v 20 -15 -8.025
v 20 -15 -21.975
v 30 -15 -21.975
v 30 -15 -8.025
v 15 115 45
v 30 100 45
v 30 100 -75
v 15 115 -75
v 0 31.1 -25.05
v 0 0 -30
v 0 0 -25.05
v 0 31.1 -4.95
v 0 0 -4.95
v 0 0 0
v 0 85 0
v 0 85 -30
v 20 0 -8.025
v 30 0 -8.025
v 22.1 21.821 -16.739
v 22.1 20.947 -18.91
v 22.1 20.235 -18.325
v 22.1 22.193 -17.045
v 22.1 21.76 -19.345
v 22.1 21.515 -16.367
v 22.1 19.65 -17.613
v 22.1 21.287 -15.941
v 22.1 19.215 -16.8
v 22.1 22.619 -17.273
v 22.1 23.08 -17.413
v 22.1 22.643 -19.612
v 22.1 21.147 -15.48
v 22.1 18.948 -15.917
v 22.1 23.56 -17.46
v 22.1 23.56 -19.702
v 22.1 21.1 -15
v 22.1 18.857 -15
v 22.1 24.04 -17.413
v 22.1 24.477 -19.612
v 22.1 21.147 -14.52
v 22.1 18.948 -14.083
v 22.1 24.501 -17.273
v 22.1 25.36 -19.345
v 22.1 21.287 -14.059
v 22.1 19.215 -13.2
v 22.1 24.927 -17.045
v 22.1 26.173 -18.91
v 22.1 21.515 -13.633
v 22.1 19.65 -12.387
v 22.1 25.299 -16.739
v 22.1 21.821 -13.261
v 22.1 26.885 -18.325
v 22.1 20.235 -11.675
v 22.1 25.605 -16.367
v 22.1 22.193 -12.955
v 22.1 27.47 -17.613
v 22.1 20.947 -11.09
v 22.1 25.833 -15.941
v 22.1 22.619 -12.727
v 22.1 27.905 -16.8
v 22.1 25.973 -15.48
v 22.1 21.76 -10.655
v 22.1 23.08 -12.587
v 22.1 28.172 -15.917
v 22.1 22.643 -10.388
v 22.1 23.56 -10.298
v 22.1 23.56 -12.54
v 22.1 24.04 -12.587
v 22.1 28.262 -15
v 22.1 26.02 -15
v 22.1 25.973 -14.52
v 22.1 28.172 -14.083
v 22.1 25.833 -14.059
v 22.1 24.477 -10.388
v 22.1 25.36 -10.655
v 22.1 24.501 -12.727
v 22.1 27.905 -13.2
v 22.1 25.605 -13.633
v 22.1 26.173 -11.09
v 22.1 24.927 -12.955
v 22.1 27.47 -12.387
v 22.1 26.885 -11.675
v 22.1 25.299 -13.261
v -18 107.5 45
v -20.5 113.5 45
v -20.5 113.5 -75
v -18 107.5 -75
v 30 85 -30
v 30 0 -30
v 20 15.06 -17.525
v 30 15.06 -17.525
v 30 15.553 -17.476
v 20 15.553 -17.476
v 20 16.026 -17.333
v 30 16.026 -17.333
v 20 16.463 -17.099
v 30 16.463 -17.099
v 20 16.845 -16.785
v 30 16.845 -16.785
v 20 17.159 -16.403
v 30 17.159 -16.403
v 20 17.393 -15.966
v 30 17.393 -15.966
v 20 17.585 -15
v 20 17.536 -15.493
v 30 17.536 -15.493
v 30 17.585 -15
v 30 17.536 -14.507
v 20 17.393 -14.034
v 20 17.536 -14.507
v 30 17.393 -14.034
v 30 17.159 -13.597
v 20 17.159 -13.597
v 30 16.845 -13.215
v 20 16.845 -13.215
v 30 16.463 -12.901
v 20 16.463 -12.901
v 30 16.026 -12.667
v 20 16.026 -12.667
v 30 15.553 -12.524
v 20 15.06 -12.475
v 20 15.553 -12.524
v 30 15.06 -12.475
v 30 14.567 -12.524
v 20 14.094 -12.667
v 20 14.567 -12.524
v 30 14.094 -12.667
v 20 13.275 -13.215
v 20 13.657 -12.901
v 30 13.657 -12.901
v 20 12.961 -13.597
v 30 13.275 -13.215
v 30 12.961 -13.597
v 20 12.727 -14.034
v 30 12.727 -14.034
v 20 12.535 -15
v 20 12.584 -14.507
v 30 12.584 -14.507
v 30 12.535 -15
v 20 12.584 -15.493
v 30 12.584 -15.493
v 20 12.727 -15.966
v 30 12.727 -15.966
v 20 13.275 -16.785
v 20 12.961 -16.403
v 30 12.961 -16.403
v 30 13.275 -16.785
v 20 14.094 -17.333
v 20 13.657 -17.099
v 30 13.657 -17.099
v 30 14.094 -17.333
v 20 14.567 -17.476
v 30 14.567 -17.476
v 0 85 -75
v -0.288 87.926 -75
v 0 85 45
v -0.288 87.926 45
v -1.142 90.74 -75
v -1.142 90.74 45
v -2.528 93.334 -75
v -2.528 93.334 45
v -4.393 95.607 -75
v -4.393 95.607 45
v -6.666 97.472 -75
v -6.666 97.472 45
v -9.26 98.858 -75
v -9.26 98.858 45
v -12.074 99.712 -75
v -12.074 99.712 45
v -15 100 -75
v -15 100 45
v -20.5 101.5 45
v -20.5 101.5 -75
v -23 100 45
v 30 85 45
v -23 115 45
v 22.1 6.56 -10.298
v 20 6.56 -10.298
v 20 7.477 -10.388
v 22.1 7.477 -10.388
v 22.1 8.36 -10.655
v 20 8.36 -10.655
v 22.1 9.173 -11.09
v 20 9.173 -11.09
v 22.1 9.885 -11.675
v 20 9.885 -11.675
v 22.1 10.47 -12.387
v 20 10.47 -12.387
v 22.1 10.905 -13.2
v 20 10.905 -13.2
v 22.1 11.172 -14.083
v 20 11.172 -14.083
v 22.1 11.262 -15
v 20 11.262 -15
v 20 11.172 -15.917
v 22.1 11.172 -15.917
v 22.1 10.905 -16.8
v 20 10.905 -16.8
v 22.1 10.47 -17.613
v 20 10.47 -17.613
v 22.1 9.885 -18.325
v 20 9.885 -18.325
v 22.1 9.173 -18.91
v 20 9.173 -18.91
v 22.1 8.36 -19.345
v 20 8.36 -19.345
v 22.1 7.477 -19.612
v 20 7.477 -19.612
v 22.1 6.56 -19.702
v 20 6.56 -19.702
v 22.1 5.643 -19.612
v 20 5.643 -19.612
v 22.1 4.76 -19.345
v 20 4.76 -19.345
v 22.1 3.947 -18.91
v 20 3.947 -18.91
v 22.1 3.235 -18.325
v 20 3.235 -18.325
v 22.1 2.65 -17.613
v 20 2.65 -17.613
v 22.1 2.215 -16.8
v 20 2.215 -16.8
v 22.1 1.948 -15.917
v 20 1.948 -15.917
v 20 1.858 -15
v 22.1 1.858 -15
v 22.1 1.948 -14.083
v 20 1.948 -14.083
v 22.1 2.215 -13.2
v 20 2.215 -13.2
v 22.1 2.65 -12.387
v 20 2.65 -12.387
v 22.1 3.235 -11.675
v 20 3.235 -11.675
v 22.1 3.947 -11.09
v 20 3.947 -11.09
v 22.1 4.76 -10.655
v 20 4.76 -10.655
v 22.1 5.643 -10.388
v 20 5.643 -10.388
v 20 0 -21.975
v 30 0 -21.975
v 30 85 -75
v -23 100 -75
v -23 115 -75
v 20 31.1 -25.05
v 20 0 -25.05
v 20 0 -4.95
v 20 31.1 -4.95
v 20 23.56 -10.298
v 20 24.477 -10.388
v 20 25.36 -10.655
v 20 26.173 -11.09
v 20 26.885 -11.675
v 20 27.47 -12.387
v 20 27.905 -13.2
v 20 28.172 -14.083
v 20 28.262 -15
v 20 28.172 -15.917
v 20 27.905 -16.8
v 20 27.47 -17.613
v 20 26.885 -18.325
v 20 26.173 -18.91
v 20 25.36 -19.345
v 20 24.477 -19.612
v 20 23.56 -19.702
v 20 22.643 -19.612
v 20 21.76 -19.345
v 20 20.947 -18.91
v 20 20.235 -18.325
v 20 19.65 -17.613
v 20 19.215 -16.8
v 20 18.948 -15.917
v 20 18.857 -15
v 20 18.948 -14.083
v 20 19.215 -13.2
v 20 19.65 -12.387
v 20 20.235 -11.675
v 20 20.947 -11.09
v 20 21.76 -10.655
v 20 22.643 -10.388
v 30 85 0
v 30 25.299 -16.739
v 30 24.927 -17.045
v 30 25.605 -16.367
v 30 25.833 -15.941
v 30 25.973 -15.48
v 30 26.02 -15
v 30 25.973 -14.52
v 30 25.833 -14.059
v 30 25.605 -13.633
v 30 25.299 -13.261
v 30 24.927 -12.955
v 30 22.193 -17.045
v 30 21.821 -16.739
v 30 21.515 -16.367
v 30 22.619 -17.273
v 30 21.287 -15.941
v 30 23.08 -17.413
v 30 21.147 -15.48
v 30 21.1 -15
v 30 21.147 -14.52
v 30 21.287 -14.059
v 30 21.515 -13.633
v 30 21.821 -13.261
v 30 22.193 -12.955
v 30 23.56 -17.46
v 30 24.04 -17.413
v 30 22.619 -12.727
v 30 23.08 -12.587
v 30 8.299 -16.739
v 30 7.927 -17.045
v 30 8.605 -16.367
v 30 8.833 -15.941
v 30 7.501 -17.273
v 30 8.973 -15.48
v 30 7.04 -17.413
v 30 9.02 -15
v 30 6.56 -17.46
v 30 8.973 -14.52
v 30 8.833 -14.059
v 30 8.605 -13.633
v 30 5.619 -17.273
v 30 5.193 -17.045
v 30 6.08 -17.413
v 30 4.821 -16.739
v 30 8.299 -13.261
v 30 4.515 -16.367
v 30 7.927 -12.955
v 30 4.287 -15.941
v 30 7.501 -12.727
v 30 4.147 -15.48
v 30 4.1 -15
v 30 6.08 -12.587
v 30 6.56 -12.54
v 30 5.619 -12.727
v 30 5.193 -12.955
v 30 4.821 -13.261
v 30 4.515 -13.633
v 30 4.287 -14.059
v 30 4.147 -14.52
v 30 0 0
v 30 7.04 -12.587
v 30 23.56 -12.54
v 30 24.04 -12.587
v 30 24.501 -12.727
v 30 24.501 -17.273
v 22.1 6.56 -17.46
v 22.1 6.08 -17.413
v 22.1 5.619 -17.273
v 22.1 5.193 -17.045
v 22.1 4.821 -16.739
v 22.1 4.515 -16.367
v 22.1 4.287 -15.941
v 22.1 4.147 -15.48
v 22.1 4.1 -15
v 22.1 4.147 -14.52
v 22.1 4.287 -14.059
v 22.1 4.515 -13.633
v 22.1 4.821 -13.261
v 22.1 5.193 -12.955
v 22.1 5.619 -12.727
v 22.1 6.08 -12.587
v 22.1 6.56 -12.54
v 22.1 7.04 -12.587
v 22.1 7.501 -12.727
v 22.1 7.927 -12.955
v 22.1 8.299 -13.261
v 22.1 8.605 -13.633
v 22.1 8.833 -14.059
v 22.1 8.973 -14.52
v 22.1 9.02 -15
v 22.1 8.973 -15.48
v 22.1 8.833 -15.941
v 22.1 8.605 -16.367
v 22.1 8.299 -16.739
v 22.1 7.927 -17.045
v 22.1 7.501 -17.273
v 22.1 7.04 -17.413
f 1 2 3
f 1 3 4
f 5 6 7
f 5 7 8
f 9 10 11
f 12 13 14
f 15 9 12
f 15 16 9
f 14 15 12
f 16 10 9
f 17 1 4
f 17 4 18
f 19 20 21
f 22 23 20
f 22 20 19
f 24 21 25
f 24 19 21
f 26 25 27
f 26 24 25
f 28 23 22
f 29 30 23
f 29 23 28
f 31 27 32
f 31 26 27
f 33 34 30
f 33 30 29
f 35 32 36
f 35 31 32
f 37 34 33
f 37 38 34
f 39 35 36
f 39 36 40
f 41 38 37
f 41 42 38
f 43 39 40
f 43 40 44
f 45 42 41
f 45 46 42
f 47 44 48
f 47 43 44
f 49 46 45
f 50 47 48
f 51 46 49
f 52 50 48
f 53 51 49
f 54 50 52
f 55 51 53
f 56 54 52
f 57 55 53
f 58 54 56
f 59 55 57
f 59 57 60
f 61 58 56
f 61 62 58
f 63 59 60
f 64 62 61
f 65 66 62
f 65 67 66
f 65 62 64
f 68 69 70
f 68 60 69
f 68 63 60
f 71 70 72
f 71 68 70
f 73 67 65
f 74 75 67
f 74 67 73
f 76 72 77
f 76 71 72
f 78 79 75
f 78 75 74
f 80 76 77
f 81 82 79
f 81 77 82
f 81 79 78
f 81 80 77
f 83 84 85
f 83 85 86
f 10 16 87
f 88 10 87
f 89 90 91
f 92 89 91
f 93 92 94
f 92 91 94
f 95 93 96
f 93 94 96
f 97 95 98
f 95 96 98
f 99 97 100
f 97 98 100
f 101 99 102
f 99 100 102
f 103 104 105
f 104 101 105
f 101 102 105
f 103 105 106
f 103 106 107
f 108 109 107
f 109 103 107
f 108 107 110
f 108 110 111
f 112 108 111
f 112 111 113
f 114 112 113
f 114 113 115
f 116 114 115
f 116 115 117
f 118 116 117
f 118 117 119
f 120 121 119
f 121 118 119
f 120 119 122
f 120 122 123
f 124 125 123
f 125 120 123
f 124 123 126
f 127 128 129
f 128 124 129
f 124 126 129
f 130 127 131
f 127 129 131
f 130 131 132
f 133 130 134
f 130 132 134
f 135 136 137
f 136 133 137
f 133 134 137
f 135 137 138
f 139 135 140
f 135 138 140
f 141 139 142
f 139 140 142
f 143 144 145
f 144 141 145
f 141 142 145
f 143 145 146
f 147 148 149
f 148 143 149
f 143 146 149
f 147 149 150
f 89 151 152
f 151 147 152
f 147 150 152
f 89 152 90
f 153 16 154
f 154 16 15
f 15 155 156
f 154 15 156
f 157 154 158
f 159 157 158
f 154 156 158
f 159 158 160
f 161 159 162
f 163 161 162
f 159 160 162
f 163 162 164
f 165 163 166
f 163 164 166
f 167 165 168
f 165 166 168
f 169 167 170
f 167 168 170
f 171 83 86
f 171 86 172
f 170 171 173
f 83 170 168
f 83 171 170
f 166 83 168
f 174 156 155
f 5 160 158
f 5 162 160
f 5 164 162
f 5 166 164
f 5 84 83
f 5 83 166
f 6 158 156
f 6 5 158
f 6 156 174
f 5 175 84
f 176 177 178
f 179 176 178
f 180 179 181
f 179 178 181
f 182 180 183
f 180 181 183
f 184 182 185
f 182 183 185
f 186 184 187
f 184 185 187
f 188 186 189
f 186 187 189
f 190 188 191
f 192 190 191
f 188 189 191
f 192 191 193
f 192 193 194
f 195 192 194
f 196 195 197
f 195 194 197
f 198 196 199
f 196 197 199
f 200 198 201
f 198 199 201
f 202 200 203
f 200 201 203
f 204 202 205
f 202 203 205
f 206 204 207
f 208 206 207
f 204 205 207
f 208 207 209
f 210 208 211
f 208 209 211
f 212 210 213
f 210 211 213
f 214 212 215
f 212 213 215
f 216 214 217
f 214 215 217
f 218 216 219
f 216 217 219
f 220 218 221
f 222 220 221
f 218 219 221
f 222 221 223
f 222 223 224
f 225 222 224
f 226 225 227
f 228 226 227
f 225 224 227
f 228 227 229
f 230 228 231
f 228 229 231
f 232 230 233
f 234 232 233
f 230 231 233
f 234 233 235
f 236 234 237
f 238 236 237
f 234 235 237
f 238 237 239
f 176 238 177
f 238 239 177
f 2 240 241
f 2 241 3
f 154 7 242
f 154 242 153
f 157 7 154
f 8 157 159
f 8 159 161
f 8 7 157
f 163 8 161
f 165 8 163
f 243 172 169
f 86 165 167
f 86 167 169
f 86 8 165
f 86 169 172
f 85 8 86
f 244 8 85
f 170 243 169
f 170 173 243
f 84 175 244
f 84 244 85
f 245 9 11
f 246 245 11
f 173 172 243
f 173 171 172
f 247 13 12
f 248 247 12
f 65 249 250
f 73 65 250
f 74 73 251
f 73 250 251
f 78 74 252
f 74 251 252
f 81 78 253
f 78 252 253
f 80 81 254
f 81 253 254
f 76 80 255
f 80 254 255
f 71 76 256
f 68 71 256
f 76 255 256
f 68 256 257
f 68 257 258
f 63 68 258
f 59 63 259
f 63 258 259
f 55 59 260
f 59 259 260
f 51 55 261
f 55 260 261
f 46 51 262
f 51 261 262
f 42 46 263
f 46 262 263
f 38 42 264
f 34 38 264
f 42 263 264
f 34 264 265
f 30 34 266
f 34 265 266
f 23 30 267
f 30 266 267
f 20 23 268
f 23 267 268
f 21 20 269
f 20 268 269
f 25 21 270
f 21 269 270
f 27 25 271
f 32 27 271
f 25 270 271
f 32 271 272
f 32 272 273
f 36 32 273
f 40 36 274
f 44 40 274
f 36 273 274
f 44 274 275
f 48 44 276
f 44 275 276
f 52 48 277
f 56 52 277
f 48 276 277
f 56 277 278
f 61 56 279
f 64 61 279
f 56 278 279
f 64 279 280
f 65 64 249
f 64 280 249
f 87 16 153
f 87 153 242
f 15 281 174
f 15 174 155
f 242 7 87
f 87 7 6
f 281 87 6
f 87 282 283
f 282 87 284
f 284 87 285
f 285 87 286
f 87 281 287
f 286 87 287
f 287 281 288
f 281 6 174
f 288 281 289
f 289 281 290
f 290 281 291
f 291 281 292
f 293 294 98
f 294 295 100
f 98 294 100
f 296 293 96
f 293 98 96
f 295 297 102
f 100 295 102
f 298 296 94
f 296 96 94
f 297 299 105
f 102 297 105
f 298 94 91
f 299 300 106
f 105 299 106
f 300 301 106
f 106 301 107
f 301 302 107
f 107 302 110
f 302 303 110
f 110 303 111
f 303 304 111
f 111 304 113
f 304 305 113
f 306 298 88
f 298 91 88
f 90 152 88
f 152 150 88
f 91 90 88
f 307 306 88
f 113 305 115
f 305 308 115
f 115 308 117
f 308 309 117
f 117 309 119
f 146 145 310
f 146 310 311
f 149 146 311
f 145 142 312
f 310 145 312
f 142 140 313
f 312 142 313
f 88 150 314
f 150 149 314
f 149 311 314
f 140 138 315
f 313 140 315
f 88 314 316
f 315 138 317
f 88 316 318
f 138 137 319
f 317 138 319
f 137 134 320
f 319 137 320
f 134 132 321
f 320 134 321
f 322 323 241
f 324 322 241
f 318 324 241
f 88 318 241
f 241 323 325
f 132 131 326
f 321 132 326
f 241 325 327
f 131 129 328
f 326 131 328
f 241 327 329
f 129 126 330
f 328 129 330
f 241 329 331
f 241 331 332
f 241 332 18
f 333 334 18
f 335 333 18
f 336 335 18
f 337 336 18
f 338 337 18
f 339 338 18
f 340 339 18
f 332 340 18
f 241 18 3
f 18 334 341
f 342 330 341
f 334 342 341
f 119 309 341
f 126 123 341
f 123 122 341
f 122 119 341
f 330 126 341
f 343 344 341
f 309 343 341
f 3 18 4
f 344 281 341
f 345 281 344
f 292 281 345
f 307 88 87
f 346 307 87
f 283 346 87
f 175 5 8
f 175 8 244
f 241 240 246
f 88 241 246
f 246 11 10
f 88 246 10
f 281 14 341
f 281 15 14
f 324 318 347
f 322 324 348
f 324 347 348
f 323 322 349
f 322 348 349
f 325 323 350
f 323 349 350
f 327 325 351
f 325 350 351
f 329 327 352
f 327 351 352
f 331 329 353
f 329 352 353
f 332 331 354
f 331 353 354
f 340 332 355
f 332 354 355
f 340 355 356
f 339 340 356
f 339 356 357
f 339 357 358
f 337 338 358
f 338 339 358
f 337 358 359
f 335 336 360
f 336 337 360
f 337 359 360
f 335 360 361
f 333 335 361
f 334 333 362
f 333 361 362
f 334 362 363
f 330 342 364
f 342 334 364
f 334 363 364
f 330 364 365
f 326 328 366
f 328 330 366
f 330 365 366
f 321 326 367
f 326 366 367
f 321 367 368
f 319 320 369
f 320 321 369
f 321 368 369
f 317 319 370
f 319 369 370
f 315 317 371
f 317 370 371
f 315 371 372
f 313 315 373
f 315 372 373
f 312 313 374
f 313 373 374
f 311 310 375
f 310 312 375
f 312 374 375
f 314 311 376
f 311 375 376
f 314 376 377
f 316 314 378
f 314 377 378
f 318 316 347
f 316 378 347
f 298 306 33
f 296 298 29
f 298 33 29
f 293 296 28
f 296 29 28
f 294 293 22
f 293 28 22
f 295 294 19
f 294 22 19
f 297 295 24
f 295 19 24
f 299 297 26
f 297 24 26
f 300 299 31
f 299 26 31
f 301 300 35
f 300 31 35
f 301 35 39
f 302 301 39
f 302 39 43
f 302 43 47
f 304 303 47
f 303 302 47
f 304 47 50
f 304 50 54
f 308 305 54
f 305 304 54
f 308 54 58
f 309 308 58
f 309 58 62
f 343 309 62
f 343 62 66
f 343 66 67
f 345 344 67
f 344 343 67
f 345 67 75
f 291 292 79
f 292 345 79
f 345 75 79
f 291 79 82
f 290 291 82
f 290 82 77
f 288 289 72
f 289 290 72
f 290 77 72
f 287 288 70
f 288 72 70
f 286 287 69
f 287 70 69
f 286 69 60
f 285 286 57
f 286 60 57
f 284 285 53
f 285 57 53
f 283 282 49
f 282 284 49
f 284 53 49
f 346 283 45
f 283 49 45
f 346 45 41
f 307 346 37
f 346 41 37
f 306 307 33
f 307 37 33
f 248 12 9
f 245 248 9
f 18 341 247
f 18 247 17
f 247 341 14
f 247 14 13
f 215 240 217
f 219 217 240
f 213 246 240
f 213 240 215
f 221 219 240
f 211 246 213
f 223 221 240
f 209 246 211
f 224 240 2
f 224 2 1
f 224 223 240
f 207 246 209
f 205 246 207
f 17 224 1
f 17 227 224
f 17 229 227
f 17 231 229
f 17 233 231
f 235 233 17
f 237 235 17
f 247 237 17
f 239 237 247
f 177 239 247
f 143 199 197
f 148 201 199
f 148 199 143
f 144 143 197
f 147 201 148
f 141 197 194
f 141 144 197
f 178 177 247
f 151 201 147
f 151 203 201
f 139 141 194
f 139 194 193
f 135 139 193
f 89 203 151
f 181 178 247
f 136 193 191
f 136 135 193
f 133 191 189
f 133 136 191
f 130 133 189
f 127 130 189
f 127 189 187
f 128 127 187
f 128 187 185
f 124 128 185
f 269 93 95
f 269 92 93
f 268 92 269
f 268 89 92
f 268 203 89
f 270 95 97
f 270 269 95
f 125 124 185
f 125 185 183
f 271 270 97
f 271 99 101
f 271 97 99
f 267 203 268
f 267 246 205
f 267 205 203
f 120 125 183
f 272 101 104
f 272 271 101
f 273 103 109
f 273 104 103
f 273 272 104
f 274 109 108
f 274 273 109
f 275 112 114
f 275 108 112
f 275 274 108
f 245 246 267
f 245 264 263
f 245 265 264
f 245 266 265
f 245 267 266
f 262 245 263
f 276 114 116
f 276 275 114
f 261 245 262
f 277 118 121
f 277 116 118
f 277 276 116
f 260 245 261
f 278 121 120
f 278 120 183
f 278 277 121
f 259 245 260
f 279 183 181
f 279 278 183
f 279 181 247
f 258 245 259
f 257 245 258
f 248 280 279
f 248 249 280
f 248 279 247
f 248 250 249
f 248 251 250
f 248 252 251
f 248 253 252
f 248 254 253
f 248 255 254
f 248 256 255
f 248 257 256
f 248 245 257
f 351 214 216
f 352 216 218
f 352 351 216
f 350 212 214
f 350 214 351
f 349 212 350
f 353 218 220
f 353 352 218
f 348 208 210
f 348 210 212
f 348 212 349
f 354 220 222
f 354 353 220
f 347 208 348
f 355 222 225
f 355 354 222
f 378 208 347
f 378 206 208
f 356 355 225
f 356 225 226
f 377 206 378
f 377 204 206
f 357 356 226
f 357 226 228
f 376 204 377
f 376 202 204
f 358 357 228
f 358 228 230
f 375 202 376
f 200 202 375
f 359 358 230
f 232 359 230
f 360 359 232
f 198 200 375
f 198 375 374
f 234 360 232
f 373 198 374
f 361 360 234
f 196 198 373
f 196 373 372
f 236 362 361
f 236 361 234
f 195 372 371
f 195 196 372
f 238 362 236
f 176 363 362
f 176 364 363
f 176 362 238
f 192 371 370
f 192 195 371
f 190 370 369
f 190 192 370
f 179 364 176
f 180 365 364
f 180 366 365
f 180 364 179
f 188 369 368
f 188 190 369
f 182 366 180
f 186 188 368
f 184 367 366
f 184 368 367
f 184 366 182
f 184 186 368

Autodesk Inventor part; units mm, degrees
ref_plane "YZ Plane" through (0, 0, 0) normal (1, 0, 0) x (0, 1, 0)
ref_plane "XZ Plane" through (0, 0, 0) normal (0, 1, 0) x (-1, 0, 0)
sketch "Sketch1" plane through (0, 0, 0) normal (0, 0, 1) x (1, 0, 0)
  line L0 (0, 0) -> (25, 0)
  line L1 (25, 0) -> (25, 40)
  line L2 (25, 40) -> (0, 40)
  line L3 (0, 40) -> (0, 0)
  dimension "d1" = 25
  dimension "d2" = 40
  dimension "d3" = 25
extrude "Extrusion1" add sketch "Sketch1" against normal blind 30
sketch "Sketch2" plane through (25, 0, 0) normal (1, 0, 0) x (0, 0, -1)
  line L0 (0, 0) -> (30, 0) projected
  circle A0 centre (15, 6.56) radius 2.46
extrude "Extrusion2" cut sketch "Sketch2" against normal blind 30
sketch "Sketch3" plane through (0, 0, 0) normal (-1, 0, 0) x (0, 0, 1)
  line L0 (0, 0) -> (-30, 0) projected
  line L1 (-25.05, 0) -> (-4.95, 0)
  line L2 (-4.95, 0) -> (-4.95, 33.12)
  line L3 (-4.95, 33.12) -> (-25.05, 33.12)
  line L4 (-25.05, 33.12) -> (-25.05, 0)
  dimension "d11" = 20.1
extrude "Extrusion3" cut sketch "Sketch3" against normal blind 20
sketch "Sketch4" plane through (0, 0, 0) normal (0, -1, 0) x (1, 0, 0)
  line L0 (20, -4.95) -> (20, -25.05) projected
  line L1 (20, -15) -> (25, -15)
  line L2 (25, 0) -> (25, -30) projected
  line L3 (20, -8.025) -> (25, -8.025)
  line L4 (25, -8.025) -> (25, -21.975)
  line L5 (25, -21.975) -> (20, -21.975)
  line L6 (20, -21.975) -> (20, -8.025)
  line L7 (20, -8.025) -> (25, -21.975) construction
  line L8 (25, -8.025) -> (20, -21.975) construction
  line L9 (25, -12.54) -> (25, -17.46) projected
  point P0 (0, 0)
  point P1 (22.5, -15)
  dimension "d14" = 13.95
extrude "Extrusion4" add sketch "Sketch4" along normal blind 15
sketch "Sketch5" plane through (20, 0, 0) normal (-1, 0, 0) x (0, 0, 1)
  circle A0 centre (-15, 6.56) radius 2.46 projected
  circle A1 centre (-15, 6.56) radius 4.7025
  circle A2 centre (-15, 6.56) radius 2.46 projected
  circle A3 centre (-15, 6.56) radius 2.46
  point P0 (0, 0)
  dimension "d17" = 9.405
extrude "Extrusion5" cut sketch "Sketch5" against normal blind 2.1
sketch "Sketch6" plane through (25, 0, 0) normal (1, 0, 0) x (0, 0, -1)
  circle A0 centre (15, 6.56) radius 4.7025 projected
  line L0 (15, 6.56) -> (15, 23.56)
  circle A1 centre (15, 23.56) radius 2.46
  point P0 (0, 0)
  dimension "d20" = 17
  dimension "d21" = 4.92
extrude "Extrusion6" cut sketch "Sketch6" against normal blind 10 contours A1
sketch "Sketch7" plane through (20, 0, 0) normal (-1, 0, 0) x (0, 0, 1)
  circle A0 centre (-15, 23.56) radius 2.46 projected
  circle A1 centre (-15, 23.56) radius 4.7025
  point P0 (0, 0)
  dimension "d24" = 9.405
extrude "Extrusion7" cut sketch "Sketch7" against normal blind 2.1
sketch "Sketch9" plane through (25, 0, 0) normal (1, 0, 0) x (0, 0, -1)
  circle A0 centre (15, 6.56) radius 2.46 projected
  circle A1 centre (15, 6.56) radius 2.46
  circle A2 centre (15, 23.56) radius 2.46 projected
  circle A3 centre (15, 23.56) radius 2.46
  line L0 (30, 40) -> (30, 0) projected
  line L1 (30, 0) -> (30, 40)
  line L2 (30, 40) -> (0, 40)
  line L3 (0, 40) -> (0, 0)
  line L4 (0, 0) -> (8.025, 0) projected
  line L5 (21.975, 0) -> (21.975, -15)
  line L6 (21.975, -15) -> (8.025, -15)
  line L7 (8.025, -15) -> (8.025, 0)
  line L8 (0, 0) -> (8.025, 0)
  line L9 (21.975, 0) -> (30, 0)
extrude "Extrusion8" add sketch "Sketch9" along normal blind 5
sketch "Sketch10" plane through (0, 40, 0) normal (0, 1, 0) x (1, 0, 0)
  line L0 (0, 30) -> (30, 30) projected
  line L1 (30, 0) -> (0, 0) projected
  line L2 (0, 30) -> (30, 30)
  line L3 (30, 30) -> (30, 0)
  line L4 (30, 0) -> (0, 0)
  line L5 (0, 0) -> (0, 30)
extrude "Extrusion9" add sketch "Sketch10" along normal blind 30
sketch "Sketch12" plane through (30, 0, 0) normal (1, 0, 0) x (0, 0, -1)
  circle A0 centre (15, 6.56) radius 2.46 projected
  line L0 (15, 6.56) -> (15, 15.06)
  circle A1 centre (15, 15.06) radius 2.525
  point P0 (0, 0)
  dimension "d31" = 8.5
  dimension "d33" = 5.05
extrude "Extrusion10" cut sketch "Sketch12" against normal blind 30 contours A1
sketch "Sketch14" plane through (0, 0, 0) normal (0, 0, 1) x (1, 0, 0)
  line L0 (30, 70) -> (0, 70) projected
  line L1 (0, 70) -> (0, 85)
  line L2 (-15, 100) -> (-23, 100)
  line L3 (30, 100) -> (15, 115)
  line L4 (-23, 115) -> (15, 115)
  line L5 (30, 0) -> (30, 70) projected
  line L6 (30, 100) -> (30, 70)
  line L7 (-20.5, 113.5) -> (-23, 115)
  line L8 (-20.5, 101.5) -> (-23, 100)
  line L9 (-18, 107.5) -> (-20.5, 101.5)
  line L10 (-18, 107.5) -> (-20.5, 113.5)
  arc A0 (0, 85) -> (-15, 100) centre (-15, 85) ccw
  point P0 (0, 0)
  point P1 (0, 100)
  dimension "d47" = 30
  dimension "d49" = 15
  dimension "d54" = 15
extrude "Extrusion12" add sketch "Sketch14" against normal blind 30
sketch "Sketch15" plane through (0, 0, -25.05) normal (-1, 0, 0) x (0, 0, 1)
  line L0 (0, 33.12) -> (20.1, 33.12) projected
  line L1 (20.1, 33.12) -> (20.1, 0) projected
  line L2 (0, 33.12) -> (20.1, 33.12)
  line L3 (20.1, 33.12) -> (20.1, 31.1)
  line L4 (20.1, 31.1) -> (0, 31.1)
  line L5 (0, 31.1) -> (0, 33.12)
  point P0 (25.05, 0)
  dimension "d57" = 2.02
extrude "Extrusion13" add sketch "Sketch15" against normal blind 20
sketch "Sketch17" plane through (0, 0, 0) normal (0, 0, 1) x (1, 0, 0)
  line L0 (-23, 115) -> (15, 115) projected
  line L1 (-23, 115) -> (15, 115)
  line L2 (30, 0) -> (30, 100) projected
  line L3 (15, 115) -> (30, 100)
  line L4 (30, 100) -> (30, 85)
  arc A0 (0, 85) -> (-15, 100) centre (-15, 85) ccw projected
  line L5 (30, 85) -> (0, 85)
  arc A1 (0, 85) -> (-15, 100) centre (-15, 85) ccw
  line L6 (-15, 100) -> (-23, 100) projected
  line L7 (-15, 100) -> (-23, 100)
  line L8 (-23, 100) -> (-20.5, 101.5) projected
  line L9 (-23, 100) -> (-20.5, 101.5)
  line L10 (-20.5, 101.5) -> (-18, 107.5) projected
  line L11 (-20.5, 101.5) -> (-18, 107.5)
  line L12 (-18, 107.5) -> (-20.5, 113.5) projected
  line L13 (-18, 107.5) -> (-20.5, 113.5)
  line L14 (-20.5, 113.5) -> (-23, 115)
  point P0 (0, 0)
extrude "Extrusion14" add sketch "Sketch17" along normal blind 45
ref_plane "Work Plane1" through (0, 0, -15) normal (0, 0, 1) x (1, 0, 0)
mirror "Mirror1" about plane through (0, 0, -15) normal (0, 0, 1) of "Extrusion14"
properties part number "12mm_x_120mm"
